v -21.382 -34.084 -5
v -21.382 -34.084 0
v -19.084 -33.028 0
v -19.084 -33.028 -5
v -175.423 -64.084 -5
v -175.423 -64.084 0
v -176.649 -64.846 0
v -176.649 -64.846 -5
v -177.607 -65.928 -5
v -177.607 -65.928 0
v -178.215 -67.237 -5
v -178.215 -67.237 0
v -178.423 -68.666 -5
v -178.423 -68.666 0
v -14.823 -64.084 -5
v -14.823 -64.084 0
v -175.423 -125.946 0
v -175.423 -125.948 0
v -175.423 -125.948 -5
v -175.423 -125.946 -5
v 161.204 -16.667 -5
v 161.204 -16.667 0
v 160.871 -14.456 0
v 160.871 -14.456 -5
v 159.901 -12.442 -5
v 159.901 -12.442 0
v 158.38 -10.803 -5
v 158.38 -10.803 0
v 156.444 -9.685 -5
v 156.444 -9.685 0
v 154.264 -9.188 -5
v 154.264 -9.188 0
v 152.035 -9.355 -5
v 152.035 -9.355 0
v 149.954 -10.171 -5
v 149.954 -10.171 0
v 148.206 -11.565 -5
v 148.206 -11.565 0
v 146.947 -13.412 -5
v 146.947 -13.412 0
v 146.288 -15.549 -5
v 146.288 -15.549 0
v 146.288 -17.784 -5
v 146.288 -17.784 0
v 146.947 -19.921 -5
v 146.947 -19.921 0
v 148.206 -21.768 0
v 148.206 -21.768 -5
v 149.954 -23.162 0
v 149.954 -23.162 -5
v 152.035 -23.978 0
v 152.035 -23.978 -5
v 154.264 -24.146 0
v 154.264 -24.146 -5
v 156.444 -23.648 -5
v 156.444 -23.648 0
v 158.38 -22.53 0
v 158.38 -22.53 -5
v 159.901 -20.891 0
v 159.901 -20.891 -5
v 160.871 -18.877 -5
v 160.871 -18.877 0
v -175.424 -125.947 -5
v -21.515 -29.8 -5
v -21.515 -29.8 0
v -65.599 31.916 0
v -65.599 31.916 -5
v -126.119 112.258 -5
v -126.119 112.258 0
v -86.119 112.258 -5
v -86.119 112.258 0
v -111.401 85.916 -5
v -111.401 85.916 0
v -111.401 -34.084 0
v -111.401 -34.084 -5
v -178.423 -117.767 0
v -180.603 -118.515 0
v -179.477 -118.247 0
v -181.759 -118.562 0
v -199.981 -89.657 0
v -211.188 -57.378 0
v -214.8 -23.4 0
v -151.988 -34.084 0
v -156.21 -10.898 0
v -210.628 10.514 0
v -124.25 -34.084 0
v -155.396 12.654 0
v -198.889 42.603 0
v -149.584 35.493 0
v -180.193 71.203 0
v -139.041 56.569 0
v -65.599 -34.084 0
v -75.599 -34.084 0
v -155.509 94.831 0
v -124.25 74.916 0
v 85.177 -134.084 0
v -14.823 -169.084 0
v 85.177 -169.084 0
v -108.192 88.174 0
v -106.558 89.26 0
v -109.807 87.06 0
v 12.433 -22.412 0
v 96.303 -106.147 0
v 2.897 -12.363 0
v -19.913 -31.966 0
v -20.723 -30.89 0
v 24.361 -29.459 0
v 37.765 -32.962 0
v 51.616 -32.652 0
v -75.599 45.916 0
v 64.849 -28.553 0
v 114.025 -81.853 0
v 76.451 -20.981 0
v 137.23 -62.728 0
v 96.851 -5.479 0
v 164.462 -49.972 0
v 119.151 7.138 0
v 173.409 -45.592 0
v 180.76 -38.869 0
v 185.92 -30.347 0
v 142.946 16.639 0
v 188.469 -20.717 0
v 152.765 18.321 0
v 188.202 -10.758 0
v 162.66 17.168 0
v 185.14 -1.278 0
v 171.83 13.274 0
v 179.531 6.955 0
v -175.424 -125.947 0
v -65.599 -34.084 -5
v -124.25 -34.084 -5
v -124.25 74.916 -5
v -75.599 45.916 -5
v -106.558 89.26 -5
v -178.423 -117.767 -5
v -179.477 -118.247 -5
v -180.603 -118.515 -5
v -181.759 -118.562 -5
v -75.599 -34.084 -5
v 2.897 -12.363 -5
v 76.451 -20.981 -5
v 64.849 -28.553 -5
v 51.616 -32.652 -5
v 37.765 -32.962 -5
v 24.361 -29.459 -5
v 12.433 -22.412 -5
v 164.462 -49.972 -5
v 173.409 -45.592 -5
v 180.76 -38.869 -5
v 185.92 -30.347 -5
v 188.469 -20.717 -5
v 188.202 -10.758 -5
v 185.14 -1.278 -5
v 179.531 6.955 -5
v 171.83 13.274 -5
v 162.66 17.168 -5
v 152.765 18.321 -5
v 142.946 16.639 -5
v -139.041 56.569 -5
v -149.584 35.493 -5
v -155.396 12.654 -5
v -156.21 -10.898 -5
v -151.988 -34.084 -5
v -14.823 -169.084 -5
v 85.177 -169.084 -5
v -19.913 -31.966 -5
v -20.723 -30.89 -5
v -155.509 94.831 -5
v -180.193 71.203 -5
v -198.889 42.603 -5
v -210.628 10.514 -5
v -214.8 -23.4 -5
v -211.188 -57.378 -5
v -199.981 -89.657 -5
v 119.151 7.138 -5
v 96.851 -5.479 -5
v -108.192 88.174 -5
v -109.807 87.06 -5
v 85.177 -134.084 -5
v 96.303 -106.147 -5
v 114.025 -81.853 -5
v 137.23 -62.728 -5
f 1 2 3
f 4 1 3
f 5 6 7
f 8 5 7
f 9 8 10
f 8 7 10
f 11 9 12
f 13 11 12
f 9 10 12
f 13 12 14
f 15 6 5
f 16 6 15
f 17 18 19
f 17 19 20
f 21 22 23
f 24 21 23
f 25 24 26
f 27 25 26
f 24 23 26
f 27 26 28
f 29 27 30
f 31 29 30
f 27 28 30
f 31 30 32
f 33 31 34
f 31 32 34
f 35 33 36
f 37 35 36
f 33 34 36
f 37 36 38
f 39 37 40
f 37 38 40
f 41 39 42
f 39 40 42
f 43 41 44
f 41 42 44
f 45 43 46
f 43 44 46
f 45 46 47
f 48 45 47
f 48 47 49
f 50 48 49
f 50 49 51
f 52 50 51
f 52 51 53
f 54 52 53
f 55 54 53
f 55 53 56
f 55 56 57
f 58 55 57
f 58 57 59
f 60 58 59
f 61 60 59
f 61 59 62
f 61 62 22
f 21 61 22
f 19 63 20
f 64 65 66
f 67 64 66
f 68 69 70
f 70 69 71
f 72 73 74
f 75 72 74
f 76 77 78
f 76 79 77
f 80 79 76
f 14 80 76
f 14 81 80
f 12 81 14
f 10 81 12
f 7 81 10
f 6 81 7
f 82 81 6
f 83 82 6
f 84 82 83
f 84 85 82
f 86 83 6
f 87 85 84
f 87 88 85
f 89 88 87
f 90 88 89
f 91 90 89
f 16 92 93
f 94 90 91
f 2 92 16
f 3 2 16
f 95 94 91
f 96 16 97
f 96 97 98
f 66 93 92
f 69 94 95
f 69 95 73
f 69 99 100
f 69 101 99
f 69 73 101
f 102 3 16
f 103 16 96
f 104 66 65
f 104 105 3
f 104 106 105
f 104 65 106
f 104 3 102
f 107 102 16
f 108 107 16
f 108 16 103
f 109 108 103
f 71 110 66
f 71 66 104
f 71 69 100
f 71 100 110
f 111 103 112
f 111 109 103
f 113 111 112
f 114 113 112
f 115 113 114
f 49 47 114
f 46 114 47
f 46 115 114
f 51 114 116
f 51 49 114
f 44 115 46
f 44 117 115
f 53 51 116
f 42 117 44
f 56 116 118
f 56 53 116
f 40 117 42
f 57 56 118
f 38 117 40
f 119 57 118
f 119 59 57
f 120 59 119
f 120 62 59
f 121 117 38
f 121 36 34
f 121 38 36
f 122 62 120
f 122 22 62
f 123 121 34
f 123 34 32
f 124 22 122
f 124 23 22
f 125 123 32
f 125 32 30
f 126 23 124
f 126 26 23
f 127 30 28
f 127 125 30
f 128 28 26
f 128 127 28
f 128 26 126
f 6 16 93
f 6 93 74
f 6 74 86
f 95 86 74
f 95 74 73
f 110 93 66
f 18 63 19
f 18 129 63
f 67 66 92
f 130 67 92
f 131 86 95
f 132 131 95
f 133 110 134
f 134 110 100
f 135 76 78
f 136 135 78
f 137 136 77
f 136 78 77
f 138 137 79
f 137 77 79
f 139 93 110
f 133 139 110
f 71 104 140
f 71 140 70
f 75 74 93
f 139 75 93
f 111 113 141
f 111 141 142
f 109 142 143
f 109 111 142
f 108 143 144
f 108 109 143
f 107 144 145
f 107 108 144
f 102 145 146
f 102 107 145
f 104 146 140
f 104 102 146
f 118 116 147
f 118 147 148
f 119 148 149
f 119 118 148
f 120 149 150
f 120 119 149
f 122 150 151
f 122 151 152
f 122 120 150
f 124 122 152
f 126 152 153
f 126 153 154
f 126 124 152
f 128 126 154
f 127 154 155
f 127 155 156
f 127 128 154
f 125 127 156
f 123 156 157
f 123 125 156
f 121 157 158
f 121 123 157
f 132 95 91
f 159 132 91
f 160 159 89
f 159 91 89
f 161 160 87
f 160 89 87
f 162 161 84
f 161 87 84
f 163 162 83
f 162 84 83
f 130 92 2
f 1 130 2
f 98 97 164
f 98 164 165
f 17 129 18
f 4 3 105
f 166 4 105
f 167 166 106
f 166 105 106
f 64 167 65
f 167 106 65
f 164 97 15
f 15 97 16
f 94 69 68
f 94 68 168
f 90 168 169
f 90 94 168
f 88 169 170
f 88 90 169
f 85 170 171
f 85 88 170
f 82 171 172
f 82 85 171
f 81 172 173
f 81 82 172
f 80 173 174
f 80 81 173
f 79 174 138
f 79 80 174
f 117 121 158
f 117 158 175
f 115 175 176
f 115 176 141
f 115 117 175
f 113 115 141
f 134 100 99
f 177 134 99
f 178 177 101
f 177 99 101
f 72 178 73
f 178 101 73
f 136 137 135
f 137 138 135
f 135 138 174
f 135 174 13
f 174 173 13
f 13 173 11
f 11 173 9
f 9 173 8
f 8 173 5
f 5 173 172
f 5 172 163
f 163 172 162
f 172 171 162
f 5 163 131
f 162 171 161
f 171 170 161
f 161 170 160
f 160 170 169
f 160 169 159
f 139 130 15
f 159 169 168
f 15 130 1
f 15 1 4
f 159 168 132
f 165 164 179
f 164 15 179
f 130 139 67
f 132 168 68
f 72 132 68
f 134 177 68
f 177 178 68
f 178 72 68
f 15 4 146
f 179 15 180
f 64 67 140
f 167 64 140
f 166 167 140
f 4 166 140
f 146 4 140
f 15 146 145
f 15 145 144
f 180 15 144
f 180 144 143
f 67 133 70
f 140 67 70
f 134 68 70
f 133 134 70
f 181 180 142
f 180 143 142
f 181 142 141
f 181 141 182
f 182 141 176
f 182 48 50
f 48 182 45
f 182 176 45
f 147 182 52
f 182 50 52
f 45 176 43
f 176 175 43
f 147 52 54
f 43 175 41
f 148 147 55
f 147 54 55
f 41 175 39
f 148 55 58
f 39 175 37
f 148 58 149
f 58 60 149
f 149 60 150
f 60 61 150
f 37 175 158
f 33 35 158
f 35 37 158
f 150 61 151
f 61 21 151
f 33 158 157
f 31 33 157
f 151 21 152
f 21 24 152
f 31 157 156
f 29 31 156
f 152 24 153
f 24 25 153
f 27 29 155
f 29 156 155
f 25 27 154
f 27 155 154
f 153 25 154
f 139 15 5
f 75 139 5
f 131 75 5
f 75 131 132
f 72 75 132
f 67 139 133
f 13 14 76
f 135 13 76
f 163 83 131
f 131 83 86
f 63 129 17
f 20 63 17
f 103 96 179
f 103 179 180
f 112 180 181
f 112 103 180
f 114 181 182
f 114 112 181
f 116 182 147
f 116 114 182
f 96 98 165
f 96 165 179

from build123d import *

# Parameters (mm, degrees)
BASE_FLANGE1_DEPTH  = 5
CUT_EXTRUDE1_DEPTH  = 10
CUT_EXTRUDE2_DEPTH  = 10
BOSS_EXTRUDE1_DEPTH = 5
CUT_EXTRUDE3_DEPTH  = 5
CUT_EXTRUDE5_DEPTH  = 5
SKETCH15_W          = 100
SKETCH15_H          = 35
BOSS_EXTRUDE2_DEPTH = 5
SKETCH16_R          = 7.5
CUT_EXTRUDE6_DEPTH  = 100


# Sheet-metal steps are written as plain solids
with BuildPart() as part:
    # Sketch1 → Base-Flange1 (new body)
    with BuildSketch(Plane.XY):
        with BuildLine():
            Line((-172.42323657, -64.083711984), (-14.82323657, -64.083711984))
            Line((-14.82323657, -64.083711984), (-14.82323657, -134.083711984))
            Line((-14.82323657, -134.083711984), (85.17676343, -134.083711984))
            ThreePointArc((85.17676343, -134.083711984), (114.024568083, -81.852692198), (164.46176985, -49.972228916))
            ThreePointArc((164.46176985, -49.972228916), (187.009648293, -5.908715918), (142.946135295, 16.639162525))
            ThreePointArc((142.946135295, 16.639162525), (107.787942262, 1.20592631), (76.450543226, -20.980798078))
            ThreePointArc((76.450543226, -20.980798078), (37.765121816, -32.96154582), (2.896719251, -12.363132081))
            Line((2.896719251, -12.363132081), (-97.103280749, 127.636867919))
            ThreePointArc((-97.103280749, 127.636867919), (-176.806189112, 48.29369713), (-172.42323657, -64.083711984))
        make_face()
    extrude(amount=-BASE_FLANGE1_DEPTH)

    # Sketch6 → Cut-Extrude1 (cut)
    with BuildSketch(Plane.XY):
        with BuildLine():
            Line((-151.988076483, -34.083711984), (-124.250121533, -34.083711984))
            Line((-124.250121533, -34.083711984), (-124.250121533, 74.916288016))
            ThreePointArc((-124.250121533, 74.916288016), (-153.103689858, 24.229516511), (-151.988076483, -34.083711984))
        make_face()
        with BuildLine():
            Line((-111.40090947, -34.083711984), (-75.598546249, -34.083711984))
            Line((-75.598546249, -34.083711984), (-75.598546249, 45.916288016))
            Line((-75.598546249, 45.916288016), (-106.558315083, 89.259964383))
            ThreePointArc((-106.558315083, 89.259964383), (-109.00197636, 87.620515753), (-111.40090947, 85.916288016))
            Line((-111.40090947, 85.916288016), (-111.40090947, -34.083711984))
        make_face()
        with BuildLine():
            Line((-65.598546249, -34.083711984), (-21.382216912, -34.083711984))
            Line((-21.382216912, -34.083711984), (-19.084071622, -33.028366909))
            ThreePointArc((-19.084071622, -33.028366909), (-20.320064907, -31.42967647), (-21.515284886, -29.800277893))
            Line((-21.515284886, -29.800277893), (-65.598546249, 31.916288016))
            Line((-65.598546249, 31.916288016), (-65.598546249, -34.083711984))
        make_face()
    extrude(amount=-CUT_EXTRUDE1_DEPTH, mode=Mode.SUBTRACT)

    # Sketch7 → Cut-Extrude2 (cut)
    with BuildSketch(Plane.XY):
        with BuildLine():
            ThreePointArc((-97.103280749, 127.636867919), (-112.063433166, 120.801319497), (-126.118657218, 112.258394975))
            Line((-126.118657218, 112.258394975), (-86.118657218, 112.258394975))
            Line((-86.118657218, 112.258394975), (-97.103280749, 127.636867919))
        make_face()
    extrude(amount=-CUT_EXTRUDE2_DEPTH, mode=Mode.SUBTRACT)

    # Sketch8 → Boss-Extrude1 (add)
    with BuildSketch(Plane.XY):
        with BuildLine():
            ThreePointArc((-126.118657218, 112.258394975), (-211.691552632, 5.764970244), (-175.42323657, -125.9475166))
            Line((-175.42323657, -125.9475166), (-175.42323657, -64.083711984))
            Line((-175.42323657, -64.083711984), (-172.42323657, -64.083711984))
            ThreePointArc((-172.42323657, -64.083711984), (-181.910795868, 32.658036849), (-126.118657218, 112.258394975))
        make_face()
    extrude(amount=-BOSS_EXTRUDE1_DEPTH)

    # Sketch9 → Cut-Extrude3 (cut)
    with BuildSketch(Plane.XY):
        with BuildLine():
            ThreePointArc((-175.42323657, -64.083711984), (-177.606536703, -65.927674892), (-178.42323657, -68.666287679))
            Line((-178.42323657, -68.666287679), (-178.42323657, -122.571183635))
            ThreePointArc((-178.42323657, -122.571183635), (-176.936364973, -124.270169842), (-175.424090186, -125.946584542))
            Line((-175.424090186, -125.946584542), (-175.42323657, -125.945602803))
            Line((-175.42323657, -125.945602803), (-175.42323657, -64.083711984))
        make_face()
        with BuildLine():
            ThreePointArc((-175.424090186, -125.946584542), (-176.936364973, -124.270169842), (-178.42323657, -122.571183635))
            Line((-178.42323657, -122.571183635), (-178.42323657, -129.395889076))
            Line((-178.42323657, -129.395889076), (-175.424090186, -125.946584542))
        make_face()
    extrude(amount=-CUT_EXTRUDE3_DEPTH, mode=Mode.SUBTRACT)


with BuildPart() as cut_extrude3_piece_1:
    # of the separate pieces the step leaves, piece 1, a body of its own (cut_extrude3_pieces)
    add(part.part.solids().sort_by_distance((-126.118657218, 112.258394975, 0))[0])

    # Sketch14 → Cut-Extrude5 (cut)
    with BuildSketch(Plane.XY):
        with BuildLine():
            ThreePointArc((-178.42323657, -117.767336057), (-181.723623091, -118.563659579), (-184.927830167, -117.441278471))
            Line((-184.927830167, -117.441278471), (-178.42323657, -122.571183635))
            Line((-178.42323657, -122.571183635), (-178.42323657, -117.767336057))
        make_face()
    extrude(amount=-CUT_EXTRUDE5_DEPTH, mode=Mode.SUBTRACT)

    # Sketch15 → Boss-Extrude2 (add)
    with BuildSketch(Plane.XY):
        with Locations((35.17676343, -151.583711984)):
            Rectangle(SKETCH15_W, SKETCH15_H)
    extrude(amount=-BOSS_EXTRUDE2_DEPTH)

    # Sketch16 → Cut-Extrude6 (cut)
    with BuildSketch(Plane.XY):
        with Locations((153.703952572, -16.666533195)):
            Circle(SKETCH16_R)
    extrude(amount=-CUT_EXTRUDE6_DEPTH, mode=Mode.SUBTRACT)


with BuildPart() as cut_extrude3_piece_2:
    # of the separate pieces the step leaves, piece 2, a body of its own (cut_extrude3_pieces)
    add(part.part.solids().sort_by_distance((-175.424090186, -125.946584542, 0))[0])


solid = Compound([cut_extrude3_piece_1.part, cut_extrude3_piece_2.part])
